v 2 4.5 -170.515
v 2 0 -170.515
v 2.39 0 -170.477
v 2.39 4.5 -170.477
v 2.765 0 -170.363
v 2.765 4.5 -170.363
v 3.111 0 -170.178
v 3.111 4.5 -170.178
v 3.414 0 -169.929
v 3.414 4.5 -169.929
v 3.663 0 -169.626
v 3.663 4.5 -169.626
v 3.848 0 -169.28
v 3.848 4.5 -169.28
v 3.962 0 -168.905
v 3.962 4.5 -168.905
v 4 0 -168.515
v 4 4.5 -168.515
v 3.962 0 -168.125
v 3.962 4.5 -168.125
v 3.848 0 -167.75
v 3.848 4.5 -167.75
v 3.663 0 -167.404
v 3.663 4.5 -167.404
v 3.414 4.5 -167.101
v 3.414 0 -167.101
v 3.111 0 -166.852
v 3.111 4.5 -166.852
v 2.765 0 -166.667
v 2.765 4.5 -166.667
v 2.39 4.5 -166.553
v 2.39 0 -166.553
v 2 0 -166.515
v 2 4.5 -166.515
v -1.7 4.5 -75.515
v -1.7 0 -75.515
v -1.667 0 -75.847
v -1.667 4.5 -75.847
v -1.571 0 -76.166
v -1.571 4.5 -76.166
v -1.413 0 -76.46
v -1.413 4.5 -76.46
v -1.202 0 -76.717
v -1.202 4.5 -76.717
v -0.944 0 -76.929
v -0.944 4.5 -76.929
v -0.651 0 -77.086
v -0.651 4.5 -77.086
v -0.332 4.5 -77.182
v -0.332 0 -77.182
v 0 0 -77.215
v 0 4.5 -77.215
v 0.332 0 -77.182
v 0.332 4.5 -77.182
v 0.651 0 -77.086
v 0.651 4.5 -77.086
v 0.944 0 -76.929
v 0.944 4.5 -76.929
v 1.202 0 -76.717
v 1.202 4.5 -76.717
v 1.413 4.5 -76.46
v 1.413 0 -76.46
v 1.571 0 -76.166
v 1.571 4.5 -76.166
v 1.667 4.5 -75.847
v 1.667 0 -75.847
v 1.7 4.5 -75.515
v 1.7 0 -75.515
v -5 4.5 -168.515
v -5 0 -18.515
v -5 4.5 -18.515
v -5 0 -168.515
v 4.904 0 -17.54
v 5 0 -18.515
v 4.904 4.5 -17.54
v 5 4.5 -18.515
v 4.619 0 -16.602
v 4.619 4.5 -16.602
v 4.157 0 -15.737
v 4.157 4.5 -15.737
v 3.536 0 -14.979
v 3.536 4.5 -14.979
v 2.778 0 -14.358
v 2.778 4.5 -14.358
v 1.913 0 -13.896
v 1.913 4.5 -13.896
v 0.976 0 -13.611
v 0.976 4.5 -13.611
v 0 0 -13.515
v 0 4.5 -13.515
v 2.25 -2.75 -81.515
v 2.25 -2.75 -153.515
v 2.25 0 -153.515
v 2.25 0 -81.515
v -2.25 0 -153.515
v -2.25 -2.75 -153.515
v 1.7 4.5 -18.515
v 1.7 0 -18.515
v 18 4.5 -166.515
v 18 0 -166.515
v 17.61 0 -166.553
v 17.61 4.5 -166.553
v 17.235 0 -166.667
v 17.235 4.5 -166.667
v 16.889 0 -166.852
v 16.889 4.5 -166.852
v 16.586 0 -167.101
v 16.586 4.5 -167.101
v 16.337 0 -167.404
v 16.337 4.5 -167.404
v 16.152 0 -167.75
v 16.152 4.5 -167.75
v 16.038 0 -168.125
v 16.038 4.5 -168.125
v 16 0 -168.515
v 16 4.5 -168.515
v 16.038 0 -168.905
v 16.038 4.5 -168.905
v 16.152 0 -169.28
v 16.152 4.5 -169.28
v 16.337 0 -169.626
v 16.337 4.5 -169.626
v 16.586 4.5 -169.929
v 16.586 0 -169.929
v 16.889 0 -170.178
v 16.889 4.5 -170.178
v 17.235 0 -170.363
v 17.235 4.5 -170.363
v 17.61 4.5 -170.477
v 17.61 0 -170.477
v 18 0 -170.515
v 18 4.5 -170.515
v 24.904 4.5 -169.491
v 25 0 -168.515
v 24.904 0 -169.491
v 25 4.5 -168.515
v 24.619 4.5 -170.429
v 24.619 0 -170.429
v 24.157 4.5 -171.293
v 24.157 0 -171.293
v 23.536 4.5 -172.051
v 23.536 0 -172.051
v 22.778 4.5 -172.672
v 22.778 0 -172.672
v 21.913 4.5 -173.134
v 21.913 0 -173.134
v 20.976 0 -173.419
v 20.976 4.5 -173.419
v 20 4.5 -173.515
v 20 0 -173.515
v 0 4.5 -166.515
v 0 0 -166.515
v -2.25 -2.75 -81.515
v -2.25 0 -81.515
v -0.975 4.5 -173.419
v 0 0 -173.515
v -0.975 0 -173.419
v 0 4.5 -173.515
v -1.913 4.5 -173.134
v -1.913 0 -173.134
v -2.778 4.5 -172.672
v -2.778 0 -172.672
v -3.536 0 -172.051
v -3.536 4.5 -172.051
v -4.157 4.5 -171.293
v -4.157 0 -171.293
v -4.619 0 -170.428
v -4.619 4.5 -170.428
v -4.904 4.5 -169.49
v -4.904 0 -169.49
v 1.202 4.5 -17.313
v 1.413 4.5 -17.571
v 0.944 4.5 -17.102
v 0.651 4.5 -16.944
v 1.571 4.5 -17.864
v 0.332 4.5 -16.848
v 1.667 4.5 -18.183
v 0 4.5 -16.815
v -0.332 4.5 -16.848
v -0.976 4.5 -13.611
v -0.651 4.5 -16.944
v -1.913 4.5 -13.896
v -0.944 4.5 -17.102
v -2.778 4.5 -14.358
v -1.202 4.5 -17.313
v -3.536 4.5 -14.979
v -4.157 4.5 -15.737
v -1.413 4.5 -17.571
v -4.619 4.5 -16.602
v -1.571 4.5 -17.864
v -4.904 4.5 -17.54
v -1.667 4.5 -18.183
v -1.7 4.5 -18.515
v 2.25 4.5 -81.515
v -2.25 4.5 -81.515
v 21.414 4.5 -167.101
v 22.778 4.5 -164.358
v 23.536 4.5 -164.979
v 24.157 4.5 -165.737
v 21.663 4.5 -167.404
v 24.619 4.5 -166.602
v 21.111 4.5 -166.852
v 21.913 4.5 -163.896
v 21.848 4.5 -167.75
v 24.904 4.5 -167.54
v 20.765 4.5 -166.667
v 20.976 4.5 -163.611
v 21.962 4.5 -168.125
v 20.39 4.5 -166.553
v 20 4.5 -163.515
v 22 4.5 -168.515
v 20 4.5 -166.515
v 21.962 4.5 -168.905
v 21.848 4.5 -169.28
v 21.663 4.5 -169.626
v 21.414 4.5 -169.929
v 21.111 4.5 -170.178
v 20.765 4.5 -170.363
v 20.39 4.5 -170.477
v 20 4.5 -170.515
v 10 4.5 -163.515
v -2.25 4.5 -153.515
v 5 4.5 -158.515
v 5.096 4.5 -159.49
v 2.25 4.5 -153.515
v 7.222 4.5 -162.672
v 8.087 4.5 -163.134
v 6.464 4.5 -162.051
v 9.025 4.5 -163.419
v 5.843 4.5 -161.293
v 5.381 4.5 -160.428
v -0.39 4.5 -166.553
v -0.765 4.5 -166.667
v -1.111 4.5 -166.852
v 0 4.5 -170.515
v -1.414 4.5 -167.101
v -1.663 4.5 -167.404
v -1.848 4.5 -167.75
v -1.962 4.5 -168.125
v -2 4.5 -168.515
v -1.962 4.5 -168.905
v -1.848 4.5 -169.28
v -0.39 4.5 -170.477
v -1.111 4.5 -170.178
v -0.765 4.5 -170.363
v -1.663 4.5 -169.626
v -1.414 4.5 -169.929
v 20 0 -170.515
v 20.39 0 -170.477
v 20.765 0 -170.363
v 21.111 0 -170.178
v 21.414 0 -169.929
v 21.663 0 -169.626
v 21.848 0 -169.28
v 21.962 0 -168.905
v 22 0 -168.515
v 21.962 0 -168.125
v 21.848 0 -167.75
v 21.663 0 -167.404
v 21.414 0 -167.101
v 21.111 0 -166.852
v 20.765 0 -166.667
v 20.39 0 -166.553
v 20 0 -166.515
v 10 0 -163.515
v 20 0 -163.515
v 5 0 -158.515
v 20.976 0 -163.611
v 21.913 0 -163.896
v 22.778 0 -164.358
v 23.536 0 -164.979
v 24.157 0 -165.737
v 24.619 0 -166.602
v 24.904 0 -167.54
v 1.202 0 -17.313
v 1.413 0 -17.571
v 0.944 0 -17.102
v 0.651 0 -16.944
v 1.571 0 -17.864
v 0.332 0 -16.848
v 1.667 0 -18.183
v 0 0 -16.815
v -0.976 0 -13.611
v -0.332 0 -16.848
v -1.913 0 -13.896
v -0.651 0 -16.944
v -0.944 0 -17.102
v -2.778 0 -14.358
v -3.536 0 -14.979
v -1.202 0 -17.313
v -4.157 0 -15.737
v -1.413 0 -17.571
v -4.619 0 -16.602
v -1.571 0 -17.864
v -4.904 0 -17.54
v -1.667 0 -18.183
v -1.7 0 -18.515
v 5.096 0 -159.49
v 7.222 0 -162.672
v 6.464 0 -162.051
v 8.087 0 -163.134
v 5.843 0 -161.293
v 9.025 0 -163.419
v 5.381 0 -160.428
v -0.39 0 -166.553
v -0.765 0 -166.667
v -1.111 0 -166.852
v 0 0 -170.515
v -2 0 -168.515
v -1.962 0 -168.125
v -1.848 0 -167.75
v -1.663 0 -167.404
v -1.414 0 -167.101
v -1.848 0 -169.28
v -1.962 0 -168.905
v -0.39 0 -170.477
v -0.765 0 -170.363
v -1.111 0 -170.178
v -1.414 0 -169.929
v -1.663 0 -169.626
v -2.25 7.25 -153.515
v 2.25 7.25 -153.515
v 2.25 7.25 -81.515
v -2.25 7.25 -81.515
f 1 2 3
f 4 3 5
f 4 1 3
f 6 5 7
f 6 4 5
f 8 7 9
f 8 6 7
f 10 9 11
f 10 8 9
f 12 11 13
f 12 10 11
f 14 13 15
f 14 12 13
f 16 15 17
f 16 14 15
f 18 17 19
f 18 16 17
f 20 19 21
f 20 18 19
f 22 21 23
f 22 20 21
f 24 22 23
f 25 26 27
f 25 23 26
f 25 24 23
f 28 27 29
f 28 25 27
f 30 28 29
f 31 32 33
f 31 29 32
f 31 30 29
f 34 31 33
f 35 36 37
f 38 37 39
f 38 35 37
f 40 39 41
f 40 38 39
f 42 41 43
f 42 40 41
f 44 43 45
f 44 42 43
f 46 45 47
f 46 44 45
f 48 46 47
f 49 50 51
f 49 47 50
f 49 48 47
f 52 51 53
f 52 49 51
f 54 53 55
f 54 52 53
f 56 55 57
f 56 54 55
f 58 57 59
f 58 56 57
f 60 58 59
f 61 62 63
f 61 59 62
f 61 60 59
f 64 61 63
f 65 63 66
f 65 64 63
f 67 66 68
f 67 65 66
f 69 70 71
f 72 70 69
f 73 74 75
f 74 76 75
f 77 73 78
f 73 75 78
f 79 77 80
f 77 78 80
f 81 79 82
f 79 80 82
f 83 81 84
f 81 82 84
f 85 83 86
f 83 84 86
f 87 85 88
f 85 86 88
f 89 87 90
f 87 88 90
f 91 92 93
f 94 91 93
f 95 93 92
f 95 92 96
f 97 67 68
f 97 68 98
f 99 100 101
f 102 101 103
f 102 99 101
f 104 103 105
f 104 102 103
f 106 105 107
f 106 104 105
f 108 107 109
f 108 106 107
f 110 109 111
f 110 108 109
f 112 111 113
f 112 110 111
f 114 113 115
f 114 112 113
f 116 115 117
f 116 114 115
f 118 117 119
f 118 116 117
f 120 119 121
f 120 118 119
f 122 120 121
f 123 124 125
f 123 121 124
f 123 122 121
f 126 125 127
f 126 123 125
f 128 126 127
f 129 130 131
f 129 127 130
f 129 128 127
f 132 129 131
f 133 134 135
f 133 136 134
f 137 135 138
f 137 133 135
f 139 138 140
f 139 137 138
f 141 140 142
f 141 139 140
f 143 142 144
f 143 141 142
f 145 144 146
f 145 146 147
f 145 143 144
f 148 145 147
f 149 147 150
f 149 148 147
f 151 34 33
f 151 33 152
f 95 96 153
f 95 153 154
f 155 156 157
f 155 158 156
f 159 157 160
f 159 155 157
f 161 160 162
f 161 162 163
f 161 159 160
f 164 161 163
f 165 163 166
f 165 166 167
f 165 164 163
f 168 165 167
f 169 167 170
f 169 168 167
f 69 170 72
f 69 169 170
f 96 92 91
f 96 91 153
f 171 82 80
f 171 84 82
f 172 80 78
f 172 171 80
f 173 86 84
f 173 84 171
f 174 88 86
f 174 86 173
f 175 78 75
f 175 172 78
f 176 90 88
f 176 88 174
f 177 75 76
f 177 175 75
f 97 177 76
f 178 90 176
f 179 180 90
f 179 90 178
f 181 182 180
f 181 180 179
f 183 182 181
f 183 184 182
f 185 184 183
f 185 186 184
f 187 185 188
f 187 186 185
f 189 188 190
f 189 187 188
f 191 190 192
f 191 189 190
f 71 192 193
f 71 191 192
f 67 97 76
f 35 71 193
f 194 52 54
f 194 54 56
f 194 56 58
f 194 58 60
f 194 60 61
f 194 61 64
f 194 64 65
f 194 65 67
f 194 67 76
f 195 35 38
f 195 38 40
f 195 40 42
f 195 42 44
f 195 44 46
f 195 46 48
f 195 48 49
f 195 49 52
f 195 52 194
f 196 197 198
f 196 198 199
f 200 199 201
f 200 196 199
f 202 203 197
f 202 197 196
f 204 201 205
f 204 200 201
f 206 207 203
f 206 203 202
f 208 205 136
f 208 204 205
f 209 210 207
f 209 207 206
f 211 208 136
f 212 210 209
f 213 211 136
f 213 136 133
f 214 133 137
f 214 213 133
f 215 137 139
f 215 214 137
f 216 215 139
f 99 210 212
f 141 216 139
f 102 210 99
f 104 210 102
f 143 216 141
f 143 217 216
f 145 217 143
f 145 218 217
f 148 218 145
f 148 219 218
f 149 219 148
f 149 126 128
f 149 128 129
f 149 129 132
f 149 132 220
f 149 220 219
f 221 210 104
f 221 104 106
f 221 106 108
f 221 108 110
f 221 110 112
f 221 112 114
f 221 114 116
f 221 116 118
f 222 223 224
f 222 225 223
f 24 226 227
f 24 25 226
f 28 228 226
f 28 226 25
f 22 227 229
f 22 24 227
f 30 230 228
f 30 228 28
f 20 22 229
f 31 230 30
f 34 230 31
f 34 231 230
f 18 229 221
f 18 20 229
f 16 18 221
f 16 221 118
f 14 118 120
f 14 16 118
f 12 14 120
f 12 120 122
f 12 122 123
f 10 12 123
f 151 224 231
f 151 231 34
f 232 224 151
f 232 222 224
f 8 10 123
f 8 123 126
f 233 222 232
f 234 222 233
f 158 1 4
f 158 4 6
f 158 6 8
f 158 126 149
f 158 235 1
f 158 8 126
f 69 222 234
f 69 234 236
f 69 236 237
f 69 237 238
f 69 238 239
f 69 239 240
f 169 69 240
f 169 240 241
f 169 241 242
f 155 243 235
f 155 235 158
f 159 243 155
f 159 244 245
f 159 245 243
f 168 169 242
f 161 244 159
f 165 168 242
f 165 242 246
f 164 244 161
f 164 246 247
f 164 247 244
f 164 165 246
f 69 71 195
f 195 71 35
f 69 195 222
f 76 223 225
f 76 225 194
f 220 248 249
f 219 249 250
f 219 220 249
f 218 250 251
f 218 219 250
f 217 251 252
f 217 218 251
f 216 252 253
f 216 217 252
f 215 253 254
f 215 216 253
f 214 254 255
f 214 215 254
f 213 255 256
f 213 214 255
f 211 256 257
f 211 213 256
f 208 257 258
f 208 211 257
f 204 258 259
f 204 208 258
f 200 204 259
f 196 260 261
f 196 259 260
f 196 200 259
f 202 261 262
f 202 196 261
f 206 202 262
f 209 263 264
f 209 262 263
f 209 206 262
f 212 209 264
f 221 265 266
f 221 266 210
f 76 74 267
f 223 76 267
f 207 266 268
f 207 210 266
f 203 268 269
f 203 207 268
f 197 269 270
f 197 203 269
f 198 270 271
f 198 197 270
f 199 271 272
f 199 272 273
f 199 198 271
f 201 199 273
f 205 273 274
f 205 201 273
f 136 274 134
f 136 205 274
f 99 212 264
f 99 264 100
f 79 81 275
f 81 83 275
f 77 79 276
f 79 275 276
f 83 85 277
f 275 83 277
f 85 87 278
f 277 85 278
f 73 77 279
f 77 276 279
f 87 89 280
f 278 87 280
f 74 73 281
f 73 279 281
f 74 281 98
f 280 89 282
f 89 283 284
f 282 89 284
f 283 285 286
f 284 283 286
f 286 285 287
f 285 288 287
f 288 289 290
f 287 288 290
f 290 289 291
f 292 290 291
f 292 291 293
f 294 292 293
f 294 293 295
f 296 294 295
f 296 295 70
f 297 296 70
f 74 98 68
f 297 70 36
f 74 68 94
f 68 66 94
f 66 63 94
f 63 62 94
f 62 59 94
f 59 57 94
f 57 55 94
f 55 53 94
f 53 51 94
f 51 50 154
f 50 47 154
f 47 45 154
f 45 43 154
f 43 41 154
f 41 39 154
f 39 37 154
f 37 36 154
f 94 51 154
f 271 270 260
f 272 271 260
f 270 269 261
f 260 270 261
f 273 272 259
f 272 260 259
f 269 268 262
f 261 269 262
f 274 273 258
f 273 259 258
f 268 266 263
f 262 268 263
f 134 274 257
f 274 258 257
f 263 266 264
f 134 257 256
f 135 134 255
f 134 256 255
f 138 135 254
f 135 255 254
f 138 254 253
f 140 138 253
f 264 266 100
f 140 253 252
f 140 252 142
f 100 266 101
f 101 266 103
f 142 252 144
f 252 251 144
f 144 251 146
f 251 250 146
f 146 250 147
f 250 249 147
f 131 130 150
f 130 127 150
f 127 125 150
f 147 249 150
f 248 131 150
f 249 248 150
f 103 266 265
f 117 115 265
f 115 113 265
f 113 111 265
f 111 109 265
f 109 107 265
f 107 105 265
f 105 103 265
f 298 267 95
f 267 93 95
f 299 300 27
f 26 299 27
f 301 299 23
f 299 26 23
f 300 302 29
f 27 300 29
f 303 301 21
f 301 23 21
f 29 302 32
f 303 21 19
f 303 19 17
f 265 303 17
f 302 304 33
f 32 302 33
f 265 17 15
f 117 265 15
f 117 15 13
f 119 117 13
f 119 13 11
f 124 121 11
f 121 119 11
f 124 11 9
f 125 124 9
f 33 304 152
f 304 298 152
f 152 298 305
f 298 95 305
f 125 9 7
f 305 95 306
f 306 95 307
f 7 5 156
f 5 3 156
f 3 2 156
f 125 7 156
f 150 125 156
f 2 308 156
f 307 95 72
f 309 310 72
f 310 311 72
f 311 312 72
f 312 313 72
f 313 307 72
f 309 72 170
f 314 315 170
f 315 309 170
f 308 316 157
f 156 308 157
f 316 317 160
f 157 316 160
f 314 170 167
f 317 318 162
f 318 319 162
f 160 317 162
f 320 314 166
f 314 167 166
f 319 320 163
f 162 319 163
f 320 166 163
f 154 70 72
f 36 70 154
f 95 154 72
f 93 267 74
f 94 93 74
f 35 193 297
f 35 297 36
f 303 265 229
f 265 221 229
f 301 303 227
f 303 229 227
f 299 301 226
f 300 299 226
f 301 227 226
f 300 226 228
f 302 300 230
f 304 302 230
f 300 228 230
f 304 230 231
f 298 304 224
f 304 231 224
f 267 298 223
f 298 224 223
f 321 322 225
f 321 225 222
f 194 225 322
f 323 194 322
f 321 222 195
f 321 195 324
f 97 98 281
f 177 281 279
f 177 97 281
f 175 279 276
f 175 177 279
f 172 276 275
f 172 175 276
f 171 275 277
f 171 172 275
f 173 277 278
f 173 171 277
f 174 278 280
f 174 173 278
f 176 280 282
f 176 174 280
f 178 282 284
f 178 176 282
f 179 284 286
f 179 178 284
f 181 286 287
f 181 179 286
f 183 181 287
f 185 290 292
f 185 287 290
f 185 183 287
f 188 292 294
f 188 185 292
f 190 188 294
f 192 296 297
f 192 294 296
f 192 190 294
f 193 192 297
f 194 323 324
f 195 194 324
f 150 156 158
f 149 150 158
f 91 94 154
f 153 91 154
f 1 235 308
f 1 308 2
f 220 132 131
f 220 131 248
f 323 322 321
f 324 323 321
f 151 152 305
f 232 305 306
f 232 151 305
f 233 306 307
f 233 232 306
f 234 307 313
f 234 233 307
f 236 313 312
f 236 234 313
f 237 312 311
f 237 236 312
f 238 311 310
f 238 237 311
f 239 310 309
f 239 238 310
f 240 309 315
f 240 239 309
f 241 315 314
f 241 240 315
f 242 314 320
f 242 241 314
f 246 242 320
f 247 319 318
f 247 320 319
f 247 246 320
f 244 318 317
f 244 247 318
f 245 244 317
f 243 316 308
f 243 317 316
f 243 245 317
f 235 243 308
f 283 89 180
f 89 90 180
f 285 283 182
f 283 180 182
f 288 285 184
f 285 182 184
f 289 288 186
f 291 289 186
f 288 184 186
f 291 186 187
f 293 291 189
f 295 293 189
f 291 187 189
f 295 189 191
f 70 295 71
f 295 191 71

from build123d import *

# Parameters (mm, degrees)
SKETCH2_W           = 10
SKETCH2_H           = 160
BOSS_EXTRUDE1_DEPTH = 4.5
SKETCH3_W           = 10
SKETCH3_H           = 4.5
BOSS_EXTRUDE2_DEPTH = 20
FILLET1_R           = 5
FILLET2_R           = 5
FILLET3_R           = 5
CUT_EXTRUDE1_DEPTH  = 30
BOSS_EXTRUDE4_START = -20
SKETCH6_W           = 4.5
SKETCH6_H           = 10
BOSS_EXTRUDE4_DEPTH = 72


with BuildPart() as part:
    # Sketch2 → Boss-Extrude1 (new body)
    with BuildSketch(Plane(origin=(0, 0, 0), x_dir=(1, 0, 0), z_dir=(0, 1, 0))):
        with Locations((0, 93.515033533)):
            Rectangle(SKETCH2_W, SKETCH2_H)
    extrude(amount=BOSS_EXTRUDE1_DEPTH)

    # Sketch3 → Boss-Extrude2 (add)
    with BuildSketch(Plane(origin=(5, 0, 0), x_dir=(0, 0, -1), z_dir=(1, 0, 0))):
        with Locations((168.515033533, 2.25)):
            Rectangle(SKETCH3_W, SKETCH3_H)
    extrude(amount=BOSS_EXTRUDE2_DEPTH)

    # Fillet1
    fillet1_edges = [part.edges().sort_by_distance(p)[0] for p in [
        (5, 2.25, -163.515033533),
        (-5, 2.25, -173.515033533),
    ]]
    fillet(fillet1_edges, radius=FILLET1_R)

    # Fillet2
    fillet2_edges = [part.edges().sort_by_distance(p)[0] for p in [
        (-5, 2.25, -13.515033533),
        (5, 2.25, -13.515033533),
    ]]
    fillet(fillet2_edges, radius=FILLET2_R - 0.0001)  # a hair under: the kernel refuses the full size

    # Fillet3
    fillet3_edges = [part.edges().sort_by_distance(p)[0] for p in [
        (25, 2.25, -173.515033533),
        (25, 2.25, -163.515033533),
    ]]
    fillet(fillet3_edges, radius=FILLET3_R - 0.0001)  # a hair under: the kernel refuses the full size

    # Sketch4 → Cut-Extrude1 (cut)
    with BuildSketch(Plane(origin=(0, 4.5, 0), x_dir=(1, 0, 0), z_dir=(0, 1, 0))):
        with BuildLine():
            Line((-1.7, 18.515033533), (-1.7, 75.515033533))
            ThreePointArc((-1.7, 75.515033533), (0, 77.215033533), (1.7, 75.515033533))
            Line((1.7, 75.515033533), (1.7, 18.515033533))
            ThreePointArc((1.7, 18.515033533), (0, 16.815033533), (-1.7, 18.515033533))
        make_face()
        with BuildLine():
            Line((2, 166.515033533), (0, 166.515033533))
            ThreePointArc((0, 166.515033533), (-2, 168.515033533), (0, 170.515033533))
            Line((0, 170.515033533), (2, 170.515033533))
            ThreePointArc((2, 170.515033533), (4, 168.515033533), (2, 166.515033533))
        make_face()
        with BuildLine():
            Line((18, 170.515033533), (20, 170.515033533))
            ThreePointArc((20, 170.515033533), (22, 168.515033533), (20, 166.515033533))
            Line((20, 166.515033533), (18, 166.515033533))
            ThreePointArc((18, 166.515033533), (16, 168.515033533), (18, 170.515033533))
        make_face()
    extrude(amount=-CUT_EXTRUDE1_DEPTH, mode=Mode.SUBTRACT)

    # Sketch6 → Boss-Extrude4 (add)
    with BuildSketch(Plane(origin=(0, 0, -173.515033533), x_dir=(-1, 0, 0), z_dir=(0, 0, -1)).offset(BOSS_EXTRUDE4_START)):
        with Locations((0, 2.25)):
            Rectangle(SKETCH6_W, SKETCH6_H)
    extrude(amount=-BOSS_EXTRUDE4_DEPTH)


solid = part.part
